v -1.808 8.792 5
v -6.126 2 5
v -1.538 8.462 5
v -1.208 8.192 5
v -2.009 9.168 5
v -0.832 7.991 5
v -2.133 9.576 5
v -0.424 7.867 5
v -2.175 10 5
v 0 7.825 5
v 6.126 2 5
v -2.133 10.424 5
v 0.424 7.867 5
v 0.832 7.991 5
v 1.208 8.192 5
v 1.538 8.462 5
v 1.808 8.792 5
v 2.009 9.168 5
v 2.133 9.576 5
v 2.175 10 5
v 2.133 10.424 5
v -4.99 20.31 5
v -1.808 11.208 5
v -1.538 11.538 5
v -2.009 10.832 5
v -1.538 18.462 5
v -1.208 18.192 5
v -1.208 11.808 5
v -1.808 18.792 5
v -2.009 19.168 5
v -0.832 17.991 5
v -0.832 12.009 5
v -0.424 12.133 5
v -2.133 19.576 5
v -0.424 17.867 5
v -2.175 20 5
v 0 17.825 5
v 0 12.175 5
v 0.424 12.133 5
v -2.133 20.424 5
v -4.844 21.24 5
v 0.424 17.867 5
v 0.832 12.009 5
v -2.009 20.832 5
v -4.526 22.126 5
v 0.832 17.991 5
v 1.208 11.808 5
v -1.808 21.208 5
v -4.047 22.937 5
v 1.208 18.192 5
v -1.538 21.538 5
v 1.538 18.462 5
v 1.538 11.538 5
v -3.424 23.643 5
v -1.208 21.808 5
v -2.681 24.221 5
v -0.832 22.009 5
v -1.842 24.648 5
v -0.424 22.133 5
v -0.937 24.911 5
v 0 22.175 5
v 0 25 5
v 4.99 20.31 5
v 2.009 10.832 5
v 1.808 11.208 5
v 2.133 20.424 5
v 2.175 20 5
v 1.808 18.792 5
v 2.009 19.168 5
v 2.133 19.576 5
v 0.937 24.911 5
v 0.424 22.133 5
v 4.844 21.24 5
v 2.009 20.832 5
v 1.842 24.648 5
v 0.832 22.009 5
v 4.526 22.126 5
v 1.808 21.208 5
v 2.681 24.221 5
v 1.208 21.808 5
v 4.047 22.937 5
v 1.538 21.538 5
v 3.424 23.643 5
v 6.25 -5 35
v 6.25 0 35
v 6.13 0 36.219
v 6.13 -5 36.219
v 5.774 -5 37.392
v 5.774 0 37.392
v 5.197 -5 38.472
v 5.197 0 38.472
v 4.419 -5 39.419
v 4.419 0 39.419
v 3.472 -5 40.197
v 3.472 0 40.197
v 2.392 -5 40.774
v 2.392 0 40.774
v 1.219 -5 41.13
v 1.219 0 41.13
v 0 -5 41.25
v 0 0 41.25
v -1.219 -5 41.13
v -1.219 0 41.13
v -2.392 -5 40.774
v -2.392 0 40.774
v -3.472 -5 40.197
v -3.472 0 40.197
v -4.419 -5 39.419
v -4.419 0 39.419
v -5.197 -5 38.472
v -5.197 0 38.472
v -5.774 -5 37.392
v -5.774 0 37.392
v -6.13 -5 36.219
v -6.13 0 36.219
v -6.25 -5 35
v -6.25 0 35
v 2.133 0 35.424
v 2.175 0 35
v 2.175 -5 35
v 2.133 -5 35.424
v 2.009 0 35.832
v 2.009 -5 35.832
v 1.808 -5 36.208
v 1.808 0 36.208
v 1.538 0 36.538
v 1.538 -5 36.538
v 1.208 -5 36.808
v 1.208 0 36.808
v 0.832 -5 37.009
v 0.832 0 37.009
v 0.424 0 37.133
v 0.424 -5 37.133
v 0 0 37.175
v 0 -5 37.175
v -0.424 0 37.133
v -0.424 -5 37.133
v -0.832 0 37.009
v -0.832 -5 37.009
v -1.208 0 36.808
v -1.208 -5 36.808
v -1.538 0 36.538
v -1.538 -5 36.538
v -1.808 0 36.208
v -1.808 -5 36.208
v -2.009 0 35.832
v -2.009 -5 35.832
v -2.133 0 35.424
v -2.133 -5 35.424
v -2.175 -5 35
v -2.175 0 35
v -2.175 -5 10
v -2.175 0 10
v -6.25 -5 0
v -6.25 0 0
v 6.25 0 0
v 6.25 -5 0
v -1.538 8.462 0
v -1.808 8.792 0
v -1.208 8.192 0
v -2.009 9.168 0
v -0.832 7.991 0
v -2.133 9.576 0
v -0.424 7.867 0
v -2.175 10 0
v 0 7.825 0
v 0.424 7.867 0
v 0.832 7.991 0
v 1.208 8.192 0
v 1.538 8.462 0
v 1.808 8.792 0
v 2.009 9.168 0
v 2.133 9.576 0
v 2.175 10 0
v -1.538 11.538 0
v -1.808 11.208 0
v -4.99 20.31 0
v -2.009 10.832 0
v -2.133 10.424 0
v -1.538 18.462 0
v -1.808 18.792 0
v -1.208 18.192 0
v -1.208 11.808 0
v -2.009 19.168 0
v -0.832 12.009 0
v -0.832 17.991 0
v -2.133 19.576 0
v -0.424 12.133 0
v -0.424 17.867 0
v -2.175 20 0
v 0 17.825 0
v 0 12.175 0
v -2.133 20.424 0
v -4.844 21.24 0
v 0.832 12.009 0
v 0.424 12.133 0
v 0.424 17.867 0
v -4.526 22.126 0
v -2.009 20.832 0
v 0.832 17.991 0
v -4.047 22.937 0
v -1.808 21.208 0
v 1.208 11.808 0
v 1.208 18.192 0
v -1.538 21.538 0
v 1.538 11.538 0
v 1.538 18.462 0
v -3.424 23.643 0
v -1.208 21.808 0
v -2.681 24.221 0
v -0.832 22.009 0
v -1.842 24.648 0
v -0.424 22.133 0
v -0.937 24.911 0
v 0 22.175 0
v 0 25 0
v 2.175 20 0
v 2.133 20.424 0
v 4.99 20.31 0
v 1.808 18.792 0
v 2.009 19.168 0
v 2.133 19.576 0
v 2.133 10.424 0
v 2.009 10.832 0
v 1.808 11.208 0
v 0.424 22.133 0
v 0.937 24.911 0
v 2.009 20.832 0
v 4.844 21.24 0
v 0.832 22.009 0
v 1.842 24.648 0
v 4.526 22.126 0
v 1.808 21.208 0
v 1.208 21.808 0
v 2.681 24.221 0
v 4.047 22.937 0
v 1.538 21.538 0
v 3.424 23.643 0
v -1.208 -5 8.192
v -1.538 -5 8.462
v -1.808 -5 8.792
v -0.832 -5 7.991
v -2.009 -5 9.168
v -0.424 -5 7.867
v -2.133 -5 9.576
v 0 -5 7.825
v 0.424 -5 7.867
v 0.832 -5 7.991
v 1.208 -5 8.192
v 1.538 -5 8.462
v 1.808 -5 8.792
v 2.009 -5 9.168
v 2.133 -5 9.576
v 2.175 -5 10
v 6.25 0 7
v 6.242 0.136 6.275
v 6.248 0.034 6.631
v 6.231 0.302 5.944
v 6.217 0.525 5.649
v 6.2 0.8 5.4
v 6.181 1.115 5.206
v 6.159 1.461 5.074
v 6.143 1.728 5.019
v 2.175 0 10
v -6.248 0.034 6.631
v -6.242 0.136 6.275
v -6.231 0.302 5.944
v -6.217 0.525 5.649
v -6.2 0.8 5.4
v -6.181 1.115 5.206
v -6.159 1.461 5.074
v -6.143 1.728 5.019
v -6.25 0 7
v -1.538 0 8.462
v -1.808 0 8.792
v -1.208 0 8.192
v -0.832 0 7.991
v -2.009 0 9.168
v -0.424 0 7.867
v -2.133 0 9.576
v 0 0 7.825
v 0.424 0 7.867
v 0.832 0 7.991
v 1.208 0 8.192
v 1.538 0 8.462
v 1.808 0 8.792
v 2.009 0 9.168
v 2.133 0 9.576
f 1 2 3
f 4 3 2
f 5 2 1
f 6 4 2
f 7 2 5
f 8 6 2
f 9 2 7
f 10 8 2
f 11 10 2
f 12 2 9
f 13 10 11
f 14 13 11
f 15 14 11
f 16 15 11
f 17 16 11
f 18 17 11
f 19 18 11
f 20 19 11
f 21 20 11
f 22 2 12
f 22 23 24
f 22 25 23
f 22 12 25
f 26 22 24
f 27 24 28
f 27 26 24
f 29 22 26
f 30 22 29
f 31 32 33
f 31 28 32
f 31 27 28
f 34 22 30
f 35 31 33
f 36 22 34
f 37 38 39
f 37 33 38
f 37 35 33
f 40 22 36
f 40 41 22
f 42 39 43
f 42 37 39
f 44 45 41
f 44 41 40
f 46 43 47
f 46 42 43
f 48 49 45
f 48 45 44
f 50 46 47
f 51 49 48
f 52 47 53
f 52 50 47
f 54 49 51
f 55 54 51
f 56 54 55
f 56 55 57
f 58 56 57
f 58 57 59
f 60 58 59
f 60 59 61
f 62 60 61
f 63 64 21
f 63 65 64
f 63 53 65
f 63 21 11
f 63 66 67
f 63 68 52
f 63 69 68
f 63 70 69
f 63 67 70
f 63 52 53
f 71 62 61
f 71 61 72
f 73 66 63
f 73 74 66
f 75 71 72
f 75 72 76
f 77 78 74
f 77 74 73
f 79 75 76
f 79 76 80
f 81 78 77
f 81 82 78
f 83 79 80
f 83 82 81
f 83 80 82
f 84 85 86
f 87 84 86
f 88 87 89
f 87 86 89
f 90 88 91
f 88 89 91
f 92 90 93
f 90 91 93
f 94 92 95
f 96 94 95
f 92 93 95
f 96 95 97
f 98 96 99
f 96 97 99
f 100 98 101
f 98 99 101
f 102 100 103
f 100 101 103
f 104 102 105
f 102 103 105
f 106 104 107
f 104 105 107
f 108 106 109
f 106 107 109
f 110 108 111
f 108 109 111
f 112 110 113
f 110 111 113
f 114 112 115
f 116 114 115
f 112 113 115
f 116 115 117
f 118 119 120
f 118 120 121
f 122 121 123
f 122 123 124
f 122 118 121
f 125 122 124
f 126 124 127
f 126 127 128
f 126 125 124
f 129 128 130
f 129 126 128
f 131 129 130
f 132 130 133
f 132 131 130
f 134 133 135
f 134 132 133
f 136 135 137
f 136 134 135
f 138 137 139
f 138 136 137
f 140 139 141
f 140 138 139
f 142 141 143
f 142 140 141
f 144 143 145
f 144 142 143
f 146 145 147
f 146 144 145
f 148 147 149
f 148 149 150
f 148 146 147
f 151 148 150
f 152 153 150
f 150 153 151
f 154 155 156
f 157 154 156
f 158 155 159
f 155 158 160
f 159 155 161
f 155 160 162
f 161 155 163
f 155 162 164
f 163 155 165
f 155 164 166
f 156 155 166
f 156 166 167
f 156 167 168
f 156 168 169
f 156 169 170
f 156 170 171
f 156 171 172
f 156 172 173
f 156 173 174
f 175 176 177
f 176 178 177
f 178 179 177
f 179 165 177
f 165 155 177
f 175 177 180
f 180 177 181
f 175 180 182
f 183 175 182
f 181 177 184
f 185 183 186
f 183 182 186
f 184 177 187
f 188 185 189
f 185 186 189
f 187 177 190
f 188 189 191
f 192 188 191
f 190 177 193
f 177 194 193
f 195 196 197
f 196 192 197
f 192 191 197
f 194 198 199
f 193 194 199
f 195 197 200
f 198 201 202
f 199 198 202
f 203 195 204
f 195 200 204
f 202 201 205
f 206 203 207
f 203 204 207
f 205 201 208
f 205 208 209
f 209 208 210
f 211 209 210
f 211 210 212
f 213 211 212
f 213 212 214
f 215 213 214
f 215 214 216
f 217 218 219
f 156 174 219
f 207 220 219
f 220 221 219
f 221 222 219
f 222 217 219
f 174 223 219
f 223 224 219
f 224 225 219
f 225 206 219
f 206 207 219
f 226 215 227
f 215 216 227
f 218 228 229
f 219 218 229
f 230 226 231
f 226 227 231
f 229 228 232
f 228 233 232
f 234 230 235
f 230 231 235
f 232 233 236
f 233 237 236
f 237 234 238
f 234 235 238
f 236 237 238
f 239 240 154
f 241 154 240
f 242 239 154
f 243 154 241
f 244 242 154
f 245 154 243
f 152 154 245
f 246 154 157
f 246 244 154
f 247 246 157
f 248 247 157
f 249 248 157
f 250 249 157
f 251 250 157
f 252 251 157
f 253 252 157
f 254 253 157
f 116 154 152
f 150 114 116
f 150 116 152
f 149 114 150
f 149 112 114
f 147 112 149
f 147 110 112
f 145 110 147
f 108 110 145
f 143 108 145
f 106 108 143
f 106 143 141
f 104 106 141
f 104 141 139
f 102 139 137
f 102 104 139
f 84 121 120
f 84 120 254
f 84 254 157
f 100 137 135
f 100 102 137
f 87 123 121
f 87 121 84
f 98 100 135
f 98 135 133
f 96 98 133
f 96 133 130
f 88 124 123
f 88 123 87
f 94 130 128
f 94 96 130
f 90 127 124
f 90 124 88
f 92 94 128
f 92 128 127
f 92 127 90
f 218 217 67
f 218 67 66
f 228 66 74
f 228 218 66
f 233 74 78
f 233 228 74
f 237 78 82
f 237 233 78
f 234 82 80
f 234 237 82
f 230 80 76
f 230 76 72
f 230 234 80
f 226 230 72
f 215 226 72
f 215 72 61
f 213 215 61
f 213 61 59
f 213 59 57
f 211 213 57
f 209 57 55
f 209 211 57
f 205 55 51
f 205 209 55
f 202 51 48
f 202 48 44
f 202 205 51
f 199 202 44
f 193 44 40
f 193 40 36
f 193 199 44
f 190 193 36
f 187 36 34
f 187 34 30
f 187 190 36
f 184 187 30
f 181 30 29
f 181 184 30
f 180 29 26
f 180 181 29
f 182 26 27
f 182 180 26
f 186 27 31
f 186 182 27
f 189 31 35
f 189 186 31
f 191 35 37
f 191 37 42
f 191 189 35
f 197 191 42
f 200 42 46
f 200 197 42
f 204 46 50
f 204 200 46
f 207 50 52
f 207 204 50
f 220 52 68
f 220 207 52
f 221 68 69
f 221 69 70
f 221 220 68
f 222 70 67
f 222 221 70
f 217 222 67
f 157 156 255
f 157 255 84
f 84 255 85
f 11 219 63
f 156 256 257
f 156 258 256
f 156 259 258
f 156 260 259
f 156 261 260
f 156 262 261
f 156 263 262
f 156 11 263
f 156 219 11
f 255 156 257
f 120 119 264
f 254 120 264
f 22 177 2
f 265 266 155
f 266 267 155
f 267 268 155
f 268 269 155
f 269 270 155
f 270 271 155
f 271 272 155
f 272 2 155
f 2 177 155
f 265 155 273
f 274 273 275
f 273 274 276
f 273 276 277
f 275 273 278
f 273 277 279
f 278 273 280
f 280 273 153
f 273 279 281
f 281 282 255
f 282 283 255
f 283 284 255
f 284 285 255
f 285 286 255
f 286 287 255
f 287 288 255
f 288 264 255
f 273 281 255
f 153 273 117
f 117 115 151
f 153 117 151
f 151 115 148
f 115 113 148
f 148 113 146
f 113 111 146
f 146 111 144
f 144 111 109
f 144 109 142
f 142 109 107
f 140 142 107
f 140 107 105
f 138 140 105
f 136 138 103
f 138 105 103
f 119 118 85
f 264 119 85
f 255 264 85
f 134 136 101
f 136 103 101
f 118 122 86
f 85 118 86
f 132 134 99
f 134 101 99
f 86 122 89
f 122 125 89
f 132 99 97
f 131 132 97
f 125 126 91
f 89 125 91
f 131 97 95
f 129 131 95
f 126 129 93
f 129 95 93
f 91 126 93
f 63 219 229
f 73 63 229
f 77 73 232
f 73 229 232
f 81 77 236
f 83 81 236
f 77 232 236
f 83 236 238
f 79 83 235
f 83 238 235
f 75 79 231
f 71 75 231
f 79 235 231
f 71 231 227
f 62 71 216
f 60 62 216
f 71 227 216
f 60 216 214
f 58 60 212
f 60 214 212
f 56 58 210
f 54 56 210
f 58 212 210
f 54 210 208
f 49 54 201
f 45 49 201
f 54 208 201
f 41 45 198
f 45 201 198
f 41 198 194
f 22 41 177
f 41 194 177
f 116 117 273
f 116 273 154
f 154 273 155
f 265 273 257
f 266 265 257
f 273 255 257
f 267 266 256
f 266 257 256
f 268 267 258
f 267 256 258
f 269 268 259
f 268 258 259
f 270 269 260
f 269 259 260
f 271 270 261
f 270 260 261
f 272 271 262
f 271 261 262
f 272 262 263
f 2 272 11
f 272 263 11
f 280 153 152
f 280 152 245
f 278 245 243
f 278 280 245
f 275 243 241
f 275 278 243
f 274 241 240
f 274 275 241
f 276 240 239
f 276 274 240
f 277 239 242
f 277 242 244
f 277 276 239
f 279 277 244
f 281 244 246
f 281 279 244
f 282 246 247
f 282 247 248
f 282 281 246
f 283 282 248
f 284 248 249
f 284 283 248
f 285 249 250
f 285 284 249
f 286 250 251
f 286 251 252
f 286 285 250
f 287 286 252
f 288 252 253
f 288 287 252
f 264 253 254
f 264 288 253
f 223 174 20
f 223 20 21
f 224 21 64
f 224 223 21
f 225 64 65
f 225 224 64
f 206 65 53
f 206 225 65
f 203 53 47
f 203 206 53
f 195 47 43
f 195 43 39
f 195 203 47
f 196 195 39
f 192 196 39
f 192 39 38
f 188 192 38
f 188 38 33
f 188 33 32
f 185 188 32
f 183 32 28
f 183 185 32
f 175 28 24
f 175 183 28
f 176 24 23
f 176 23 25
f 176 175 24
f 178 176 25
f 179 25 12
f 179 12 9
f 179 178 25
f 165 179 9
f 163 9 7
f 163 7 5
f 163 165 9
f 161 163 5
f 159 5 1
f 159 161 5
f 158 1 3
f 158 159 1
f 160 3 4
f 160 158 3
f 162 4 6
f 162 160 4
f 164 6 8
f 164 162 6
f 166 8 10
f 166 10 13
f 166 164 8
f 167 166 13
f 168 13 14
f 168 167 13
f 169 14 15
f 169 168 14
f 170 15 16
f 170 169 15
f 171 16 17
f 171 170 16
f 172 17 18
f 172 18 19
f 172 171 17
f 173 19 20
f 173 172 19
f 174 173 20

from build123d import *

# Parameters (mm, degrees)
SKETCH_R     = 2.175
PAD_DEPTH    = 5
PAD001_DEPTH = 5
FILLET_R     = 2


with BuildPart() as part:
    # Sketch → Pad (new body)
    with BuildSketch(Plane.XY):
        with BuildLine():
            Line((-6.25, 0), (6.25, 0))
            Line((4.990412, 20.309504), (6.25, 0))
            ThreePointArc((4.990412, 20.309504), (0, 25), (-4.990412, 20.309504))
            Line((-4.990412, 20.309504), (-6.25, 0))
        make_face()
        with Locations((0, 20)):
            Circle(SKETCH_R, mode=Mode.SUBTRACT)
        with Locations((0, 10)):
            Circle(SKETCH_R, mode=Mode.SUBTRACT)
    extrude(amount=PAD_DEPTH)

    # Sketch001 (on Face3 of Pad) → Pad001 (join)
    with BuildSketch(Plane.XZ):
        with BuildLine():
            Line((6.25, 5), (6.25, 35))
            ThreePointArc((6.25, 35), (0, 41.25), (-6.25, 35))
            Line((-6.25, 5), (-6.25, 35))
            Line((-6.25, 5), (-6.25, 0))
            Line((-6.25, 0), (6.25, 0))
            Line((6.25, 0), (6.25, 5))
        make_face()
        with BuildLine():
            ThreePointArc((2.175, 35), (1.8e-05, 37.175), (-2.175, 35.000036))
            Line((-2.175, 10), (-2.175, 35.000036))
            ThreePointArc((-2.175, 10), (0, 7.825), (2.175, 10))
            Line((2.175, 35), (2.175, 10))
        make_face(mode=Mode.SUBTRACT)
    extrude(amount=PAD001_DEPTH)

    # Fillet
    fillet_edges = [part.edges().sort_by_distance(p)[0] for p in [
        (0, 0, 5),
    ]]
    fillet(fillet_edges, radius=FILLET_R)


solid = part.part
